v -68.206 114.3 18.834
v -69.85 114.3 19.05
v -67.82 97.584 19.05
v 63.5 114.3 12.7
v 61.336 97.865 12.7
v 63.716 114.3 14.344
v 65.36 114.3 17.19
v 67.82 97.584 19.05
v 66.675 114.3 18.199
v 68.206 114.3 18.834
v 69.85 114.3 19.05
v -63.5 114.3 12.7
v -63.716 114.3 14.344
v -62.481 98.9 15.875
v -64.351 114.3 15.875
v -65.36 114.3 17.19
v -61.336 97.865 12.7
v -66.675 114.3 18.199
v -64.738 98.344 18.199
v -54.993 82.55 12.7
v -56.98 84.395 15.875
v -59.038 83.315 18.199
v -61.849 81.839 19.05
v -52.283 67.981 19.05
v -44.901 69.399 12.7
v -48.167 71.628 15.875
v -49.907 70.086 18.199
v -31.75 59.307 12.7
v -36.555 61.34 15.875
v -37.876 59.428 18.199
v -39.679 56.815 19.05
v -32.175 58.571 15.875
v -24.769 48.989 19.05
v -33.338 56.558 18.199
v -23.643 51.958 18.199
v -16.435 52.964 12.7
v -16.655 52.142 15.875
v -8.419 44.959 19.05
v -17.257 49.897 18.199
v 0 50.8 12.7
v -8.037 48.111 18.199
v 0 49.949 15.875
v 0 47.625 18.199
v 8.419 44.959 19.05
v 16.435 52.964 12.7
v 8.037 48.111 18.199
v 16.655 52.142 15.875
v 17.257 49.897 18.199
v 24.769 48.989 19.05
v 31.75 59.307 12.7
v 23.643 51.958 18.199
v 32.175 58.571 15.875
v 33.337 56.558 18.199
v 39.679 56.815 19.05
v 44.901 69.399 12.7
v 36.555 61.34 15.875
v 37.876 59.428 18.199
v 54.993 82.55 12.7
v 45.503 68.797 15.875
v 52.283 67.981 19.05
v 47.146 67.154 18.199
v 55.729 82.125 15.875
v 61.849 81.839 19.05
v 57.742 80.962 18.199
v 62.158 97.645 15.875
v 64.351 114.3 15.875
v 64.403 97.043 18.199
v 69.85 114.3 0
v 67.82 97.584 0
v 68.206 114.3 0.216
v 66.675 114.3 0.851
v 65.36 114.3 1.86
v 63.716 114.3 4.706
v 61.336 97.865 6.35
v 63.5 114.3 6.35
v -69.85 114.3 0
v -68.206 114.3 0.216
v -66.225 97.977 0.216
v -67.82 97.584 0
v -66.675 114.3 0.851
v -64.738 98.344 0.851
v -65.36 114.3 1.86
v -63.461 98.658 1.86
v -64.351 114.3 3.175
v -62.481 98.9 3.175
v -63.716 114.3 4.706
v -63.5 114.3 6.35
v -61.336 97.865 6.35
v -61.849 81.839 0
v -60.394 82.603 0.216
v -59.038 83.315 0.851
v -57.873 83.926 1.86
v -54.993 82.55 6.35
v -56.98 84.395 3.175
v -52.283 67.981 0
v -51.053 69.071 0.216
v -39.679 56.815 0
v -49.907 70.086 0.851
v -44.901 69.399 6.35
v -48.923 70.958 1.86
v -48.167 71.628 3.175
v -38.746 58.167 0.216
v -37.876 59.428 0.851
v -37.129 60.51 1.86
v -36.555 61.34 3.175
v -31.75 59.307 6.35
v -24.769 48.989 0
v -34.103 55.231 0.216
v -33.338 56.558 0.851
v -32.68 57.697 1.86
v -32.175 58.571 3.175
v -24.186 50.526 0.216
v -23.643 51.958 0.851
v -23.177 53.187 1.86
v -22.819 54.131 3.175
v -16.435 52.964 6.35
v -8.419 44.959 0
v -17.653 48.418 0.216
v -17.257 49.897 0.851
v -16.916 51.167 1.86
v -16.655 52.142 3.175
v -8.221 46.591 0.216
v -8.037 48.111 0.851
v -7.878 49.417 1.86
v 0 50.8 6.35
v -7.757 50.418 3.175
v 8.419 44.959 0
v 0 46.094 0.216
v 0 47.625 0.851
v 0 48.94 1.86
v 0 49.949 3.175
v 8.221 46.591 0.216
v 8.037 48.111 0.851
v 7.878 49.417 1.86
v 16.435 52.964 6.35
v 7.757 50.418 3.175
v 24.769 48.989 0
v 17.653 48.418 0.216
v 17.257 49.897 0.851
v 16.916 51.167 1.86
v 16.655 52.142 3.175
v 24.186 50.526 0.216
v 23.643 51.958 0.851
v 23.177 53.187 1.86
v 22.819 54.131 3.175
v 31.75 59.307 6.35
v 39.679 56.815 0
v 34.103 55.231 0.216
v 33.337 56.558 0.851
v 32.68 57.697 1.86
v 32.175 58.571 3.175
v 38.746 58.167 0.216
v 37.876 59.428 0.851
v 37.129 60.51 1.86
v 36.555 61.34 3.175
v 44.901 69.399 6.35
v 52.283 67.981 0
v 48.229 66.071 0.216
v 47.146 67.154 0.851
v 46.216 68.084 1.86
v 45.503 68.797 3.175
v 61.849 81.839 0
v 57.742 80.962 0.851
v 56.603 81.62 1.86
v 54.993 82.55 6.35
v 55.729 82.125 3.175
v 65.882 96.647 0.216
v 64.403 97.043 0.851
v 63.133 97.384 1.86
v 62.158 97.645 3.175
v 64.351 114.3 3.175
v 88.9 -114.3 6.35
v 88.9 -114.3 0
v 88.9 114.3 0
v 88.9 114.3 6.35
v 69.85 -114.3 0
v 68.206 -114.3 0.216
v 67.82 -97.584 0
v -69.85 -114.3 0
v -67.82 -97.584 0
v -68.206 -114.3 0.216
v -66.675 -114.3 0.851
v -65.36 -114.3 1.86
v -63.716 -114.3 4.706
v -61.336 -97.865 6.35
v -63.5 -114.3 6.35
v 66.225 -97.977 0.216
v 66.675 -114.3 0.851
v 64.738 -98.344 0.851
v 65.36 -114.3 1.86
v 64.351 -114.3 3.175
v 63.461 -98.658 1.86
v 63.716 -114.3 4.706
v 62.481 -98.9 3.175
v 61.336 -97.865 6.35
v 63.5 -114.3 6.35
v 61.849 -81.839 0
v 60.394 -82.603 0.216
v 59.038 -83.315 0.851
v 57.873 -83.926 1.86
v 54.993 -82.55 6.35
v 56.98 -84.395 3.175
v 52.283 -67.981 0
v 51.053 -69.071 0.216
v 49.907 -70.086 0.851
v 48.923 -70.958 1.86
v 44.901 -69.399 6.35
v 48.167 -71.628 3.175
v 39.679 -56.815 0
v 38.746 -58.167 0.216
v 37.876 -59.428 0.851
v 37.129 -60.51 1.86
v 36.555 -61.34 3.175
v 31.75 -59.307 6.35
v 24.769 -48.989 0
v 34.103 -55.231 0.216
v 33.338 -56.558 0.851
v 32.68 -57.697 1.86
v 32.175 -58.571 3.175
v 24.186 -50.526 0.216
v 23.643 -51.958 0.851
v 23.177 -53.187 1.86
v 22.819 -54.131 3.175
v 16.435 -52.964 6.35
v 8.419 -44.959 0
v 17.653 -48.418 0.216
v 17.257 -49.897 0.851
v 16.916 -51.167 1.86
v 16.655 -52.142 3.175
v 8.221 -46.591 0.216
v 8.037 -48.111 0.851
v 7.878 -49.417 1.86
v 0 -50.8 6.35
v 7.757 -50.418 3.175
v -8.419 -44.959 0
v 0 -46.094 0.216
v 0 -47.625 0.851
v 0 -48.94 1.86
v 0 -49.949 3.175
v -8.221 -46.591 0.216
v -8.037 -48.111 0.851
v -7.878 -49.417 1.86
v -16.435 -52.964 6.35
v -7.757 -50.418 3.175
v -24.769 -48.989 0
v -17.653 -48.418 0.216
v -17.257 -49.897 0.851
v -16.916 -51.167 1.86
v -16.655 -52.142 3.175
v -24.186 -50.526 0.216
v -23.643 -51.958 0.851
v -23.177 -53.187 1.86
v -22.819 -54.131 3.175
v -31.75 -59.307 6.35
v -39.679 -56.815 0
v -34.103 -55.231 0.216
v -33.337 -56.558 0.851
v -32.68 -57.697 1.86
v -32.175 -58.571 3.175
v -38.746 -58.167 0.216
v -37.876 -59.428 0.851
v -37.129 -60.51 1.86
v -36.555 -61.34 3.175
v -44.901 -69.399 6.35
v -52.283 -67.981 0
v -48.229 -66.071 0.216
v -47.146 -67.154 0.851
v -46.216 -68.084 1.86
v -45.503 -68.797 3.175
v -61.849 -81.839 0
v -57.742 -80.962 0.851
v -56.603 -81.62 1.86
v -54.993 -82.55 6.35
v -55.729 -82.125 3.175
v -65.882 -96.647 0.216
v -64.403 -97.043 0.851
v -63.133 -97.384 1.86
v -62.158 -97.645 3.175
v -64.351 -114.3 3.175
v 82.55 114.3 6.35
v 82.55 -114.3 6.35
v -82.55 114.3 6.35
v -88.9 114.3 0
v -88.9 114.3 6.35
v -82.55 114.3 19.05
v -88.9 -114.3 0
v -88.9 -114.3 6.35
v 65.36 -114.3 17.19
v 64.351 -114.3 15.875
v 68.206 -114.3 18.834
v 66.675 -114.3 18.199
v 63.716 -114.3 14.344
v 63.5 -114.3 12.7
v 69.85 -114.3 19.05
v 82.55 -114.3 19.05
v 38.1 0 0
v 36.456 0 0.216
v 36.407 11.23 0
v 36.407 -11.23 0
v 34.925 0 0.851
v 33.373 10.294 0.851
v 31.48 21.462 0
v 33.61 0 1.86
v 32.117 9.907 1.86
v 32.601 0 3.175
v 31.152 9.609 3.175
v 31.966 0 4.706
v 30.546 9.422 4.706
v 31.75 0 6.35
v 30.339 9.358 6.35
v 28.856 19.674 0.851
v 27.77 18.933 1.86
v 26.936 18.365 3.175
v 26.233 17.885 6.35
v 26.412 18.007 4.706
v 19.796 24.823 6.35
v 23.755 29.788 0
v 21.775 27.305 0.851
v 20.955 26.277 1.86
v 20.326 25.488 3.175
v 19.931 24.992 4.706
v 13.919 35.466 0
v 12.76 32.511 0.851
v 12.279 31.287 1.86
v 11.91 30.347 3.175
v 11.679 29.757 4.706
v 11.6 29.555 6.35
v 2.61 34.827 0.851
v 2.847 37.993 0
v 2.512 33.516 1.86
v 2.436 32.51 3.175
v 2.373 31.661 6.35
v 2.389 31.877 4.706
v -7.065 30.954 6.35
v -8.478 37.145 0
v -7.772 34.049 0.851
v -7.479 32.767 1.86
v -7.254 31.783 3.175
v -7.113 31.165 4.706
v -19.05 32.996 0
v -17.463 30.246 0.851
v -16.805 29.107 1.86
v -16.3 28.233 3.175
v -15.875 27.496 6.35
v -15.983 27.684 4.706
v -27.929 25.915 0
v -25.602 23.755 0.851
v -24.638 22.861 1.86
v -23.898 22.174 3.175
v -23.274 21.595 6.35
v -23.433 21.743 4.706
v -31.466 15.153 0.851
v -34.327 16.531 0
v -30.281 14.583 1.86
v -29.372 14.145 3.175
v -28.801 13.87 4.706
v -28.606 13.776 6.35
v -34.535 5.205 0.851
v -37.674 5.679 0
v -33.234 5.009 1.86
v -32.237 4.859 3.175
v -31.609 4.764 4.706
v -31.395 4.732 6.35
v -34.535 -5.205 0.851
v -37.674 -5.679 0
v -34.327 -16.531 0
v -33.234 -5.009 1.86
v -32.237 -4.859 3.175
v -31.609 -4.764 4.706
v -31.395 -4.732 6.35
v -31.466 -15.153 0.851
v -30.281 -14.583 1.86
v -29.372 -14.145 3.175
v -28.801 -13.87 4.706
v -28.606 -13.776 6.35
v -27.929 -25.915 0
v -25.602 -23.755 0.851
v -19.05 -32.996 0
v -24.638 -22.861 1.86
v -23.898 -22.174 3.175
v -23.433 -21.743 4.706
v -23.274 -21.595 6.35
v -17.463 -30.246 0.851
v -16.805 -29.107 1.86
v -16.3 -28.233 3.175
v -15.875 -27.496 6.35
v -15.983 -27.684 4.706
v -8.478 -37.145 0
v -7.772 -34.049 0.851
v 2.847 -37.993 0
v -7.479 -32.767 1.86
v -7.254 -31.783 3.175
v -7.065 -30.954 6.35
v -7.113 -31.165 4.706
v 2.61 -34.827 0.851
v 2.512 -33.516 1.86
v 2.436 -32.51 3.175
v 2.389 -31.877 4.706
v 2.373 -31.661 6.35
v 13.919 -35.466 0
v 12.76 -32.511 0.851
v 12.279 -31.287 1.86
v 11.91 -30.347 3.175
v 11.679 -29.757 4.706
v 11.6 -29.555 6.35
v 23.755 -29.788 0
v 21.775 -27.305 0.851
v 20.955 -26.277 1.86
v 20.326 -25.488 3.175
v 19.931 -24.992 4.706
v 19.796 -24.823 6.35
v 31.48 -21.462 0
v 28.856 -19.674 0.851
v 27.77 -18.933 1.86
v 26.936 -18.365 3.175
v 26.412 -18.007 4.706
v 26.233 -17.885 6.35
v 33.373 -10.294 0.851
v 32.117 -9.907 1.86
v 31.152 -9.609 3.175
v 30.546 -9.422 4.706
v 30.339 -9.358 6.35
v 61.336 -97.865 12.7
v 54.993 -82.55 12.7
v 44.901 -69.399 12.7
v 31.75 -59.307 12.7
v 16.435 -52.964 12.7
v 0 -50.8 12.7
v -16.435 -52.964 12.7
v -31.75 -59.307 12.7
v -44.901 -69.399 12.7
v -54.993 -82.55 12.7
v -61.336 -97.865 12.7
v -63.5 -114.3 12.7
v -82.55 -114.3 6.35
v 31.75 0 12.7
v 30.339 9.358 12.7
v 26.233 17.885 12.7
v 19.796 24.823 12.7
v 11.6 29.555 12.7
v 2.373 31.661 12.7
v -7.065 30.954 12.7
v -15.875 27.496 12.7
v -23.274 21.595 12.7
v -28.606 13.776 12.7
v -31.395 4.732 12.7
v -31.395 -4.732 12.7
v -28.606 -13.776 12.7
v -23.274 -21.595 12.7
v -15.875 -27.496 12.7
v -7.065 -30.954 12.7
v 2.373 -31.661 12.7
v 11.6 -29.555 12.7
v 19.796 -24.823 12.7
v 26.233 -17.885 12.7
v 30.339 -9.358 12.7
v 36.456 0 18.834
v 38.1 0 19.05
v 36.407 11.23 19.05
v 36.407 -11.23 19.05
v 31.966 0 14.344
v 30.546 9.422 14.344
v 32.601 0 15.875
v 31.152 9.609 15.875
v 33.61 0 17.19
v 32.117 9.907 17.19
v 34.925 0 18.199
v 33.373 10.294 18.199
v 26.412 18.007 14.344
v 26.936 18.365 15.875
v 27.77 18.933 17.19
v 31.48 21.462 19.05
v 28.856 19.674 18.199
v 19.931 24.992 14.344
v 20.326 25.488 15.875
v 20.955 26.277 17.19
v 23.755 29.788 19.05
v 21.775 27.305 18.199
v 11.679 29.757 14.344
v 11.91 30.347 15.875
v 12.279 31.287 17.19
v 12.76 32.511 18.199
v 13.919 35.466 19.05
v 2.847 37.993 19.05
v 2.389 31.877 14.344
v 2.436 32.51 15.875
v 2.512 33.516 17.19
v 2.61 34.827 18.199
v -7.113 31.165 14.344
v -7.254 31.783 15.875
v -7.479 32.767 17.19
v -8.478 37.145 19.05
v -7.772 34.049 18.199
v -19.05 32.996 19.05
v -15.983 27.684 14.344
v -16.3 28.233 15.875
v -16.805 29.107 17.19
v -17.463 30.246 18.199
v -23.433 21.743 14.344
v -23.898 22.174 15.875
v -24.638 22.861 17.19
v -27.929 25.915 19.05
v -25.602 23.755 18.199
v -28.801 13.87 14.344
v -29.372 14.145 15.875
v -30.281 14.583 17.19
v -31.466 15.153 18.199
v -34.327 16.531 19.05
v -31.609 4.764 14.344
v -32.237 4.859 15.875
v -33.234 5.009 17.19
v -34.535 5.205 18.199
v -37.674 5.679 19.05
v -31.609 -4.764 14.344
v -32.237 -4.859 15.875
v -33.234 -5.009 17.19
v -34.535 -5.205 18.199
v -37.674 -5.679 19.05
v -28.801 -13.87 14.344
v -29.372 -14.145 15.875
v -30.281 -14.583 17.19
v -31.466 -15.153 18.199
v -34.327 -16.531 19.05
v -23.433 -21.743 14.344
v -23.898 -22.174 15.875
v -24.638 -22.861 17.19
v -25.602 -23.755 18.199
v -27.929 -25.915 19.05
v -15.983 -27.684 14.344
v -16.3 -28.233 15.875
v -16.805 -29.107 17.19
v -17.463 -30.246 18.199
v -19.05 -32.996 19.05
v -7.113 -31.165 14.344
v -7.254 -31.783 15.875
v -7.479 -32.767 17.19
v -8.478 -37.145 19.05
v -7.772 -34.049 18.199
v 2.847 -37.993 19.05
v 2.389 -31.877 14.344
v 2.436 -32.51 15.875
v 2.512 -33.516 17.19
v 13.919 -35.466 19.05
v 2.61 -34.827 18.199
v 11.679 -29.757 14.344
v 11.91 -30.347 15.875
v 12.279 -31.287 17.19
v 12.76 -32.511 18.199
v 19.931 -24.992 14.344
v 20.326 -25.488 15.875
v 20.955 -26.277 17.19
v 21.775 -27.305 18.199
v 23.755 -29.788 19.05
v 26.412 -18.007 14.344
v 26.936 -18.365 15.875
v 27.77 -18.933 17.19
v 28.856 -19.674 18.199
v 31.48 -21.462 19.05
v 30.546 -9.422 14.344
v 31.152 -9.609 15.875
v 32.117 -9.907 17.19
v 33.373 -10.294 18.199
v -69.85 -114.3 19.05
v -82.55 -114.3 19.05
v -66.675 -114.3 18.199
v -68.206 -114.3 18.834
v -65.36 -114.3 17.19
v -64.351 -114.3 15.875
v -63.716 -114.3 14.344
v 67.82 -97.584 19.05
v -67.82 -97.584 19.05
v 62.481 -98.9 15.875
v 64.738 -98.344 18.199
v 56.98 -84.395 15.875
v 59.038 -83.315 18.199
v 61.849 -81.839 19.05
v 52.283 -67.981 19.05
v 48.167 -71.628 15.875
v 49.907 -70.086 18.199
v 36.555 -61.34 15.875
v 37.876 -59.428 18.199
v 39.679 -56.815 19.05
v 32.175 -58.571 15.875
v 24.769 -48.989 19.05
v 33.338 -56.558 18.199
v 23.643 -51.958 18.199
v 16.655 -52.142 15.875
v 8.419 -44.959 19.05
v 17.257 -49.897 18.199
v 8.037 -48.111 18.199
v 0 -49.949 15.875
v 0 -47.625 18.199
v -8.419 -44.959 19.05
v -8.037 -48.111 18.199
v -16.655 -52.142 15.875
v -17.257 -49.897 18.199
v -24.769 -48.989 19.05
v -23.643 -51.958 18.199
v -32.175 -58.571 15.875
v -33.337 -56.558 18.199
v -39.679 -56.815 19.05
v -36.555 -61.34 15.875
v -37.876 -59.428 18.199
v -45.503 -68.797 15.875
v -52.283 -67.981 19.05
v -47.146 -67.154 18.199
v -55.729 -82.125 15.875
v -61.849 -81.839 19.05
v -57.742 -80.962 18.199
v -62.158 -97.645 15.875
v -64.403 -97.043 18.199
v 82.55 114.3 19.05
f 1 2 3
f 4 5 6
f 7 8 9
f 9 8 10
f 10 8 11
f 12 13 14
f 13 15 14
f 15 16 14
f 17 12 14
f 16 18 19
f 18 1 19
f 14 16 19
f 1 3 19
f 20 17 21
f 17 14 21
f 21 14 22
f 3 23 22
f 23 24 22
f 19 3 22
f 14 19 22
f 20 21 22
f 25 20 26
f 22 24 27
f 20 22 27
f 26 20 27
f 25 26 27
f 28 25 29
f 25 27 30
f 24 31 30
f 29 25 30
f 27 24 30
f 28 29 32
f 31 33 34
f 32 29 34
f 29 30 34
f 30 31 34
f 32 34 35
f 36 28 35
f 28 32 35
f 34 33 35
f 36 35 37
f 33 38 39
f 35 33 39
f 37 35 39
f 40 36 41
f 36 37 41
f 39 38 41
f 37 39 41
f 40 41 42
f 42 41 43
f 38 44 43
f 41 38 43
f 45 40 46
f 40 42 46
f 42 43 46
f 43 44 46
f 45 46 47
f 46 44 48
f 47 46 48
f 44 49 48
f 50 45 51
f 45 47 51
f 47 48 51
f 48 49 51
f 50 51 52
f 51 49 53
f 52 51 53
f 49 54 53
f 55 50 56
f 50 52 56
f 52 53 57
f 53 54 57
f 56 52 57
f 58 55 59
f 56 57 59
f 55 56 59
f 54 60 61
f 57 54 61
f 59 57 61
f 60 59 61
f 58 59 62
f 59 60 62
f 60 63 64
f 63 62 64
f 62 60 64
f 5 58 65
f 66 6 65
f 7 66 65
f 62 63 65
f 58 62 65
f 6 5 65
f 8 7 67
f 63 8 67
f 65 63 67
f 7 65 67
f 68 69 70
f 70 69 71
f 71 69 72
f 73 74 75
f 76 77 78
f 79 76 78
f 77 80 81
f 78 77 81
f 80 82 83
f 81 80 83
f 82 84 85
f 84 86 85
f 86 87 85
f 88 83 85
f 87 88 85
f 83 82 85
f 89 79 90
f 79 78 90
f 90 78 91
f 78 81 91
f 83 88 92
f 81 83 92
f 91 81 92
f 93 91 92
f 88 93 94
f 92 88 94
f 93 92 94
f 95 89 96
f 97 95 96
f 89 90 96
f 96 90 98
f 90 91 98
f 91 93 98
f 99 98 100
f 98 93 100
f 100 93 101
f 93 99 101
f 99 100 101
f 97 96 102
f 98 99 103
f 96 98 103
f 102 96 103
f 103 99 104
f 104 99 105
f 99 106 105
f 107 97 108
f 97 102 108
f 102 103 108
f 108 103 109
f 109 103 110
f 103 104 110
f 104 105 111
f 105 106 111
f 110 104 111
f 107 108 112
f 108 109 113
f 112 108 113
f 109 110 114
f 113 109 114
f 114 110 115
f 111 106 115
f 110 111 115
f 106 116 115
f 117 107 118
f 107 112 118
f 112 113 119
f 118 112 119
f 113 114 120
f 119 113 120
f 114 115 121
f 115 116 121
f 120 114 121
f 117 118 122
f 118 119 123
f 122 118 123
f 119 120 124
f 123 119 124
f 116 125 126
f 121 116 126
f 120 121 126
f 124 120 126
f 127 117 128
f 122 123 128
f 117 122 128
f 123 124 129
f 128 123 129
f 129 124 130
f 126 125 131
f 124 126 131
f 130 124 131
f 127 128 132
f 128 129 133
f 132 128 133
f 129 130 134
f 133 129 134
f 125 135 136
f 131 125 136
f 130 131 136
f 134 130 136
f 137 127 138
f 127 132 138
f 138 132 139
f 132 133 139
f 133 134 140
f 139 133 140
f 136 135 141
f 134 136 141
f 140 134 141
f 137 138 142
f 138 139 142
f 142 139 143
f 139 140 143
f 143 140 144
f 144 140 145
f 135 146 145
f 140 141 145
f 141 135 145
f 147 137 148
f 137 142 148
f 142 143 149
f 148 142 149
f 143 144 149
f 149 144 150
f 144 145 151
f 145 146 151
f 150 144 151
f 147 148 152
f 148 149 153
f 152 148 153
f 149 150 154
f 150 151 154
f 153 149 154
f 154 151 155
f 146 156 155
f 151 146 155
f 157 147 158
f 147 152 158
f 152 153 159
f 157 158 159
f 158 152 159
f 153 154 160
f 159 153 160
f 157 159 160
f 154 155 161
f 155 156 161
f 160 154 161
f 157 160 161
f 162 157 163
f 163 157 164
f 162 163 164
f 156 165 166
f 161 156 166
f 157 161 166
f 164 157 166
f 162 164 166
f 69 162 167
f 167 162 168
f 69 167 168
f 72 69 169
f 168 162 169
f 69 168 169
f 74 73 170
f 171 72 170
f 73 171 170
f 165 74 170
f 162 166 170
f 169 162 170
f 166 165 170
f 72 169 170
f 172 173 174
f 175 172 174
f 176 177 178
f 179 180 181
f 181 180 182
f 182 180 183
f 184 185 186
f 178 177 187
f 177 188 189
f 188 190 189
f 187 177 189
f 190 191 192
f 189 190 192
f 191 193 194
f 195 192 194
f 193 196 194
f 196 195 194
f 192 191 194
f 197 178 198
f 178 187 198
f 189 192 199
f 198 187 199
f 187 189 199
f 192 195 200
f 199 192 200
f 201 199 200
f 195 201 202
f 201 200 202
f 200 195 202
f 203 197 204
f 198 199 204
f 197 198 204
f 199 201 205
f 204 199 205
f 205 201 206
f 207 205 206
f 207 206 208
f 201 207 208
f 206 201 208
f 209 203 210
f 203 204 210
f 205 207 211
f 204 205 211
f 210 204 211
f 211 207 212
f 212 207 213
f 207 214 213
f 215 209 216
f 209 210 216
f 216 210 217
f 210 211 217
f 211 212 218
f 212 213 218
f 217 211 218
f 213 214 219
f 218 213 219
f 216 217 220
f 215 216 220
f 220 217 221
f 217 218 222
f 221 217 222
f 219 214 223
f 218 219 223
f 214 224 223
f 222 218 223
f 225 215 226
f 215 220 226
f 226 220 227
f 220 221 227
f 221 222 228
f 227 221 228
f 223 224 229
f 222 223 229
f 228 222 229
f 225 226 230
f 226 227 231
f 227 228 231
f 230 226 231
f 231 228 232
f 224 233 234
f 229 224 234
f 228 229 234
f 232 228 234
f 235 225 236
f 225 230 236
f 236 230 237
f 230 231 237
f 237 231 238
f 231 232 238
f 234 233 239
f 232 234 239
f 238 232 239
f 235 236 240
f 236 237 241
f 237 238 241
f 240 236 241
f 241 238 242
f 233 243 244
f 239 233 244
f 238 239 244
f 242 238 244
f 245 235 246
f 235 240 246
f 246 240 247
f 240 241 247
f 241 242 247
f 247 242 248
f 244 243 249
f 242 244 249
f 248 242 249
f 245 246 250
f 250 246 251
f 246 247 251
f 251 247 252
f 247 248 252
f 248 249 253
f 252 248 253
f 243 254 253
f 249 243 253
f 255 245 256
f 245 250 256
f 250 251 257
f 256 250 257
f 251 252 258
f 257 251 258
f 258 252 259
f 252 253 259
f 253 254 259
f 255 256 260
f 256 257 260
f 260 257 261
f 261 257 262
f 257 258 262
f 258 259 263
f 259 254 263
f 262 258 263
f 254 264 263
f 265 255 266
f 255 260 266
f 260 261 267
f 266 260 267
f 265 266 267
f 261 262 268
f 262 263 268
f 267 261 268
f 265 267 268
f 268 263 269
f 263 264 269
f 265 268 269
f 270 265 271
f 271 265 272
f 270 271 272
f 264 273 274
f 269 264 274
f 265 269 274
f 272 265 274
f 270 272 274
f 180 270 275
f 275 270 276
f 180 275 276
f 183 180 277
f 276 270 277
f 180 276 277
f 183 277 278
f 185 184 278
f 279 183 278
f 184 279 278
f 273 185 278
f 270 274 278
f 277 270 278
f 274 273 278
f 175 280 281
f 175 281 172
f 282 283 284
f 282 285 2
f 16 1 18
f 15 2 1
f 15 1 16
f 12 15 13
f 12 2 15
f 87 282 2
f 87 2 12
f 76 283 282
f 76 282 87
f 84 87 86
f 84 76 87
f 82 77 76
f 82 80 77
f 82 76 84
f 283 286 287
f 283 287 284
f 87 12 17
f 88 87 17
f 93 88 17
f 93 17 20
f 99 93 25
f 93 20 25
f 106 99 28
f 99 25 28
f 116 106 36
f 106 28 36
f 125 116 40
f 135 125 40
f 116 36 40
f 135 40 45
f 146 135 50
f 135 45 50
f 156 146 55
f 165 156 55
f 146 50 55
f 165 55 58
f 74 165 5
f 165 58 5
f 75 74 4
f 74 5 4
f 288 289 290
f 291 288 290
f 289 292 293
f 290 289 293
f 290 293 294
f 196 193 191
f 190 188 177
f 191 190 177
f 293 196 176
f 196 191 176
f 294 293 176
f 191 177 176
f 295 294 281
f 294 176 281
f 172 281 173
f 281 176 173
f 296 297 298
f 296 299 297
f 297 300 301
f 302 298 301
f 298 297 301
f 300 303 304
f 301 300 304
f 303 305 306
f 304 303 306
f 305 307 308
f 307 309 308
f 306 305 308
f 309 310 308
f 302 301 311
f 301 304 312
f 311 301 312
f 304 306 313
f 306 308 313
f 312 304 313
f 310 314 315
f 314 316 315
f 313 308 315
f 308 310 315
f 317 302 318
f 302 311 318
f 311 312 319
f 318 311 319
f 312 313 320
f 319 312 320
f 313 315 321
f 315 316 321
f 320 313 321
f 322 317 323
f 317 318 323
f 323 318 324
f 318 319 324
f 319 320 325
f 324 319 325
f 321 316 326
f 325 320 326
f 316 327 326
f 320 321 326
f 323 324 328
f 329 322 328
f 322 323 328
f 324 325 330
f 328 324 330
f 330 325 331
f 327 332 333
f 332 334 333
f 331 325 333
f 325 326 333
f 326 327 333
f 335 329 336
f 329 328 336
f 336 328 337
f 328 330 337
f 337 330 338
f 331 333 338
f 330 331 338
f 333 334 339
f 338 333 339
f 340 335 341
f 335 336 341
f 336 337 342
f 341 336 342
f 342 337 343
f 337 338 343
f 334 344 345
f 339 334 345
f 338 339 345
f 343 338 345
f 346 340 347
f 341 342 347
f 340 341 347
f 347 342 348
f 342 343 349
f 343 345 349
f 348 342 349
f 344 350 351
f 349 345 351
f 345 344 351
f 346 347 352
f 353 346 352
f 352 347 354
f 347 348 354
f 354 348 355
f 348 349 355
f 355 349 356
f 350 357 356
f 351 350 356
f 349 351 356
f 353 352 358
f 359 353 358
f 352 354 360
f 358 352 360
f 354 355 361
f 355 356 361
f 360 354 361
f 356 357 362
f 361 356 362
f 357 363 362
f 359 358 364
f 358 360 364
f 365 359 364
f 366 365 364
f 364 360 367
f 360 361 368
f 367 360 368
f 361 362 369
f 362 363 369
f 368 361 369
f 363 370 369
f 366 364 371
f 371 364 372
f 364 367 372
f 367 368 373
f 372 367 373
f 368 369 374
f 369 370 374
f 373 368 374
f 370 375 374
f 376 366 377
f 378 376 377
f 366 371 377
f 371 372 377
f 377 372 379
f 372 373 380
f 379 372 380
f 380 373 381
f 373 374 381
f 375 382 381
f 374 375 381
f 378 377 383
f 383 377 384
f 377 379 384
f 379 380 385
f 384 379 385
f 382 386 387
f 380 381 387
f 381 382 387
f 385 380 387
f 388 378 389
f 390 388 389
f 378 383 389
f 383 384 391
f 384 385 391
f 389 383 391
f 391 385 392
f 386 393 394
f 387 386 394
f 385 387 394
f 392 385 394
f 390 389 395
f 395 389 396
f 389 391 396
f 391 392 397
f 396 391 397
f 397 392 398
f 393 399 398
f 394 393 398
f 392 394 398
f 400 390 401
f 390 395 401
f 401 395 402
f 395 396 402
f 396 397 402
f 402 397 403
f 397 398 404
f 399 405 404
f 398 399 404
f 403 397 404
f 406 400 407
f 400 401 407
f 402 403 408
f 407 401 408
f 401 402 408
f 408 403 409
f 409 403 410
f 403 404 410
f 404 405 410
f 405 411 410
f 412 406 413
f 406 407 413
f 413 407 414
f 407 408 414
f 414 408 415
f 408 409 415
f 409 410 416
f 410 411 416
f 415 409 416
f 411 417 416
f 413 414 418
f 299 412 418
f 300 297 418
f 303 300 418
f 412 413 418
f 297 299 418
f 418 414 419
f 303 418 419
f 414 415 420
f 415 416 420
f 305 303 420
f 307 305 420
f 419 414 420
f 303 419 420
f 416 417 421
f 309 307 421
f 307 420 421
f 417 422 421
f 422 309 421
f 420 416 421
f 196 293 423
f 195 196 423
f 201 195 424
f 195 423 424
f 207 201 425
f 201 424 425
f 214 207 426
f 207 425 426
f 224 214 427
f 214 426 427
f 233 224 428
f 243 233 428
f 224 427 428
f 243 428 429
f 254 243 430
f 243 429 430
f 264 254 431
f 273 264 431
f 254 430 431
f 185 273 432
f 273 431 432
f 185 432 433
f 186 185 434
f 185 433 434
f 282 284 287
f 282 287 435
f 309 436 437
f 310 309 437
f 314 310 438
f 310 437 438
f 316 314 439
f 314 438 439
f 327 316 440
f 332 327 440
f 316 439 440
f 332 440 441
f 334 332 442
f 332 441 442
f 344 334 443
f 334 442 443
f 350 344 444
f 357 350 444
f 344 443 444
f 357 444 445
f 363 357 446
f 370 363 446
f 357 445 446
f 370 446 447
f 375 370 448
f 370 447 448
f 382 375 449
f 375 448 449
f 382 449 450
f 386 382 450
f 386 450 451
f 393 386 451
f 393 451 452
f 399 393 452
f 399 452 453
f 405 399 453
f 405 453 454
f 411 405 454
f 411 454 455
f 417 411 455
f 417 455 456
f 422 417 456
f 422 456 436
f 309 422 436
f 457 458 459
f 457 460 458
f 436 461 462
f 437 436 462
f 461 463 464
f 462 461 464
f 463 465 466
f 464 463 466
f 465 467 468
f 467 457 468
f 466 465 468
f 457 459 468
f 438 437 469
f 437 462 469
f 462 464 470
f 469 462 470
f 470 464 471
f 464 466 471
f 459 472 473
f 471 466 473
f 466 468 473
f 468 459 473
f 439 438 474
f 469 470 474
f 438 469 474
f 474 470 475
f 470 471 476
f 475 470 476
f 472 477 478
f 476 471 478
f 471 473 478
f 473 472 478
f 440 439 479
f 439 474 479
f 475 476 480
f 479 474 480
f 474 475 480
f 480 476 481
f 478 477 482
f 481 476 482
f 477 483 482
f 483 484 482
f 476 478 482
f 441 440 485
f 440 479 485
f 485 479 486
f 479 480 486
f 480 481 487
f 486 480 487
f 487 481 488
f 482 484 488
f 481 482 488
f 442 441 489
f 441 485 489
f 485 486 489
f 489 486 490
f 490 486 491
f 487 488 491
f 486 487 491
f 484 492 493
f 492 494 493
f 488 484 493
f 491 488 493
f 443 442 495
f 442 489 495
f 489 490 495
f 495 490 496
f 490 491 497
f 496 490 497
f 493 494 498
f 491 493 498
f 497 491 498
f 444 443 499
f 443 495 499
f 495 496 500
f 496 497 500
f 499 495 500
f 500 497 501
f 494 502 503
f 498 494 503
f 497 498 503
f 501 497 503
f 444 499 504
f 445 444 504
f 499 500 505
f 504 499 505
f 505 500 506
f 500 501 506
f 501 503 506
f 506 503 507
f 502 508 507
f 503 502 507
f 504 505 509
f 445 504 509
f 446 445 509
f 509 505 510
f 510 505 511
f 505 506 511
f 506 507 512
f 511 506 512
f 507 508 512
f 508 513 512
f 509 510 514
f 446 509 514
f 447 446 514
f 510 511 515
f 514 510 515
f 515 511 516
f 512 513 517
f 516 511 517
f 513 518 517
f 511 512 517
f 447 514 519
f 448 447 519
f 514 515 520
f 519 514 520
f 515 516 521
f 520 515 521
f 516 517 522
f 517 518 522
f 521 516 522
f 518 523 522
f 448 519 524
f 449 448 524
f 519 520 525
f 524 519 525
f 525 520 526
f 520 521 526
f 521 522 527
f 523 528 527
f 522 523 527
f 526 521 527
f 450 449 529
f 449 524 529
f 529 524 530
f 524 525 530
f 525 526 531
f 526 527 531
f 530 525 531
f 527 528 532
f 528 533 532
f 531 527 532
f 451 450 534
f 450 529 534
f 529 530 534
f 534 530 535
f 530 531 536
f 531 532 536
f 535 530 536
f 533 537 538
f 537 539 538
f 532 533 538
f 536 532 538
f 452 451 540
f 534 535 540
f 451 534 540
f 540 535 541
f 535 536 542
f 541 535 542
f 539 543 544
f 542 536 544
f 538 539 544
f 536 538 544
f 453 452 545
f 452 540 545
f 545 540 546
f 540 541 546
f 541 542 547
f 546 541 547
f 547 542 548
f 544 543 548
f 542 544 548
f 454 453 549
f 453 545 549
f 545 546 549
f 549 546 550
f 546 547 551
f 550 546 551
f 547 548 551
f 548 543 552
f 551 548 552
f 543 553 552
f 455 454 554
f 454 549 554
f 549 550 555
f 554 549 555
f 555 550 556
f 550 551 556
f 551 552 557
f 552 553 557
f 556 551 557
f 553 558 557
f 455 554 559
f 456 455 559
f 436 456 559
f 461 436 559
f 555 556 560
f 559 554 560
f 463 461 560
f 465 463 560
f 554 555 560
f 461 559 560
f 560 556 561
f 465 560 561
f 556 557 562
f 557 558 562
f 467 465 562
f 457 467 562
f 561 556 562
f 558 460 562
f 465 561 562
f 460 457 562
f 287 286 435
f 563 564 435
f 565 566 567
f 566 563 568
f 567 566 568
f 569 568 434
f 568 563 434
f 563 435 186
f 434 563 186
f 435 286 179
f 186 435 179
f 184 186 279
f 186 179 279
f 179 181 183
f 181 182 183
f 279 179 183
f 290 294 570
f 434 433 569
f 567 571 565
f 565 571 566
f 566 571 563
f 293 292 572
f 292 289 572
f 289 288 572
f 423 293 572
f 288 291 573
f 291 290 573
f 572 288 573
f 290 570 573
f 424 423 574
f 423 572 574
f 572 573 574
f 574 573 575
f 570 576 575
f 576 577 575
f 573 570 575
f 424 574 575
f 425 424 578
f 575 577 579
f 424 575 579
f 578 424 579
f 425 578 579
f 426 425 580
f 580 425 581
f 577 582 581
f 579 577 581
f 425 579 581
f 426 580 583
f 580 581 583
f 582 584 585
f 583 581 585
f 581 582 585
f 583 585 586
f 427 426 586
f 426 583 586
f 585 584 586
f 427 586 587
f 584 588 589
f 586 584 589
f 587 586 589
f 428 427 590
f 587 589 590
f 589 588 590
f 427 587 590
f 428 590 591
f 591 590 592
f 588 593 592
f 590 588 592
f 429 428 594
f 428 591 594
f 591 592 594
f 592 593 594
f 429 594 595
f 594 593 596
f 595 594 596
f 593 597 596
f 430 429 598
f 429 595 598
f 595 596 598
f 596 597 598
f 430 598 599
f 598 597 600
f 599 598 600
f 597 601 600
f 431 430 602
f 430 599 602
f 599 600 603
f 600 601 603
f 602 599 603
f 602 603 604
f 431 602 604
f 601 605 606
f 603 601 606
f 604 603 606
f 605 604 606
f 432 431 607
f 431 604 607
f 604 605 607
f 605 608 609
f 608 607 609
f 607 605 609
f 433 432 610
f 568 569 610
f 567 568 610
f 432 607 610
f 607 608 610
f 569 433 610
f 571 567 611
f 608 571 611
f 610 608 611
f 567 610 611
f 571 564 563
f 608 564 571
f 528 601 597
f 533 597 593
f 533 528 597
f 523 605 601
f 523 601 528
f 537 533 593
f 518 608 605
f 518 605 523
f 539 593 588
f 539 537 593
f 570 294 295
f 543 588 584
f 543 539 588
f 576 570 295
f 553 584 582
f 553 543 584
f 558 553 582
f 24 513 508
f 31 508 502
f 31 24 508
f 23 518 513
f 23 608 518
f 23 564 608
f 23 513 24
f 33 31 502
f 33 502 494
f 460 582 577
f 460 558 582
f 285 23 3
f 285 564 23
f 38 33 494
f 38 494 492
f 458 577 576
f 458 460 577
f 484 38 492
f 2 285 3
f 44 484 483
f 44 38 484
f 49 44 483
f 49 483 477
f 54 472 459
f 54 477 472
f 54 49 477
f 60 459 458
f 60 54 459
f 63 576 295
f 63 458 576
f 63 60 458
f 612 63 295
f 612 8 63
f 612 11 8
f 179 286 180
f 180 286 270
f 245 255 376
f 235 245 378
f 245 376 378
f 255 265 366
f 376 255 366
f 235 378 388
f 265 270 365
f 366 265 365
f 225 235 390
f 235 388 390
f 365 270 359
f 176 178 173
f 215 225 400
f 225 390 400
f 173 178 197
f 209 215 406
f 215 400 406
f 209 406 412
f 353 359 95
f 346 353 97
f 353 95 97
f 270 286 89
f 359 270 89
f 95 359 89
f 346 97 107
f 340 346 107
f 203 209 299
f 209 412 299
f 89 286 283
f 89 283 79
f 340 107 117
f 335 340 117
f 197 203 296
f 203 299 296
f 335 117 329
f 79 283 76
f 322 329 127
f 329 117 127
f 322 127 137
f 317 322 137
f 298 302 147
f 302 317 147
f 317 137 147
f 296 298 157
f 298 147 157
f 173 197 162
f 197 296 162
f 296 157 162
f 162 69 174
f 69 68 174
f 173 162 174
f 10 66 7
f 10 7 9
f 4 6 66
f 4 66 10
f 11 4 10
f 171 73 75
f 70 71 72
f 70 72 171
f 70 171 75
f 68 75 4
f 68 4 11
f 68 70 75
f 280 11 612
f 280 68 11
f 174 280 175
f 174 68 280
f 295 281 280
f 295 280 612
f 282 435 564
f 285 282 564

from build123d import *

# Parameters (mm, degrees)
F0_W     = 177.8
F0_H     = 228.6
F1_DEPTH = 19.05
F2_W     = 6.35
F2_H     = 12.7
F3_DEPTH = 254
F4_R     = 63.5
F4_R_2   = 31.75
F5_DEPTH = 25.4
F6_R     = 6.35


with BuildPart() as f1:
    # F0 (on Top) → F1 (new body)
    with BuildSketch(Plane.XY):
        Rectangle(F0_W, F0_H)
    extrude(amount=F1_DEPTH)

    # F2 (on face) → F3 (cut)
    with BuildSketch(Plane.XZ.offset(114.3)):
        with Locations((85.725, 12.7)):
            Rectangle(F2_W, F2_H)
        with Locations((-85.725, 12.7)):
            Rectangle(F2_W, F2_H)
    extrude(amount=-F3_DEPTH, mode=Mode.SUBTRACT)

    # F4 (on face) → F5 (cut)
    with BuildSketch(Plane.XY.offset(19.05)):
        with Locations((0, -114.3)):
            Circle(F4_R)
        with Locations((0, 114.3)):
            Circle(F4_R)
        Circle(F4_R_2)
    extrude(amount=-F5_DEPTH, mode=Mode.SUBTRACT)

    # F6
    f6_edges = [f1.edges().sort_by_distance(p)[0] for p in [
        (0, 50.8, 0),
        (-31.75, 0, 0),
        (0, -50.8, 0),
        (0, 50.8, 19.05),
        (-31.75, 0, 19.05),
        (0, -50.8, 19.05),
    ]]
    fillet(f6_edges, radius=F6_R)


solid = f1.part
